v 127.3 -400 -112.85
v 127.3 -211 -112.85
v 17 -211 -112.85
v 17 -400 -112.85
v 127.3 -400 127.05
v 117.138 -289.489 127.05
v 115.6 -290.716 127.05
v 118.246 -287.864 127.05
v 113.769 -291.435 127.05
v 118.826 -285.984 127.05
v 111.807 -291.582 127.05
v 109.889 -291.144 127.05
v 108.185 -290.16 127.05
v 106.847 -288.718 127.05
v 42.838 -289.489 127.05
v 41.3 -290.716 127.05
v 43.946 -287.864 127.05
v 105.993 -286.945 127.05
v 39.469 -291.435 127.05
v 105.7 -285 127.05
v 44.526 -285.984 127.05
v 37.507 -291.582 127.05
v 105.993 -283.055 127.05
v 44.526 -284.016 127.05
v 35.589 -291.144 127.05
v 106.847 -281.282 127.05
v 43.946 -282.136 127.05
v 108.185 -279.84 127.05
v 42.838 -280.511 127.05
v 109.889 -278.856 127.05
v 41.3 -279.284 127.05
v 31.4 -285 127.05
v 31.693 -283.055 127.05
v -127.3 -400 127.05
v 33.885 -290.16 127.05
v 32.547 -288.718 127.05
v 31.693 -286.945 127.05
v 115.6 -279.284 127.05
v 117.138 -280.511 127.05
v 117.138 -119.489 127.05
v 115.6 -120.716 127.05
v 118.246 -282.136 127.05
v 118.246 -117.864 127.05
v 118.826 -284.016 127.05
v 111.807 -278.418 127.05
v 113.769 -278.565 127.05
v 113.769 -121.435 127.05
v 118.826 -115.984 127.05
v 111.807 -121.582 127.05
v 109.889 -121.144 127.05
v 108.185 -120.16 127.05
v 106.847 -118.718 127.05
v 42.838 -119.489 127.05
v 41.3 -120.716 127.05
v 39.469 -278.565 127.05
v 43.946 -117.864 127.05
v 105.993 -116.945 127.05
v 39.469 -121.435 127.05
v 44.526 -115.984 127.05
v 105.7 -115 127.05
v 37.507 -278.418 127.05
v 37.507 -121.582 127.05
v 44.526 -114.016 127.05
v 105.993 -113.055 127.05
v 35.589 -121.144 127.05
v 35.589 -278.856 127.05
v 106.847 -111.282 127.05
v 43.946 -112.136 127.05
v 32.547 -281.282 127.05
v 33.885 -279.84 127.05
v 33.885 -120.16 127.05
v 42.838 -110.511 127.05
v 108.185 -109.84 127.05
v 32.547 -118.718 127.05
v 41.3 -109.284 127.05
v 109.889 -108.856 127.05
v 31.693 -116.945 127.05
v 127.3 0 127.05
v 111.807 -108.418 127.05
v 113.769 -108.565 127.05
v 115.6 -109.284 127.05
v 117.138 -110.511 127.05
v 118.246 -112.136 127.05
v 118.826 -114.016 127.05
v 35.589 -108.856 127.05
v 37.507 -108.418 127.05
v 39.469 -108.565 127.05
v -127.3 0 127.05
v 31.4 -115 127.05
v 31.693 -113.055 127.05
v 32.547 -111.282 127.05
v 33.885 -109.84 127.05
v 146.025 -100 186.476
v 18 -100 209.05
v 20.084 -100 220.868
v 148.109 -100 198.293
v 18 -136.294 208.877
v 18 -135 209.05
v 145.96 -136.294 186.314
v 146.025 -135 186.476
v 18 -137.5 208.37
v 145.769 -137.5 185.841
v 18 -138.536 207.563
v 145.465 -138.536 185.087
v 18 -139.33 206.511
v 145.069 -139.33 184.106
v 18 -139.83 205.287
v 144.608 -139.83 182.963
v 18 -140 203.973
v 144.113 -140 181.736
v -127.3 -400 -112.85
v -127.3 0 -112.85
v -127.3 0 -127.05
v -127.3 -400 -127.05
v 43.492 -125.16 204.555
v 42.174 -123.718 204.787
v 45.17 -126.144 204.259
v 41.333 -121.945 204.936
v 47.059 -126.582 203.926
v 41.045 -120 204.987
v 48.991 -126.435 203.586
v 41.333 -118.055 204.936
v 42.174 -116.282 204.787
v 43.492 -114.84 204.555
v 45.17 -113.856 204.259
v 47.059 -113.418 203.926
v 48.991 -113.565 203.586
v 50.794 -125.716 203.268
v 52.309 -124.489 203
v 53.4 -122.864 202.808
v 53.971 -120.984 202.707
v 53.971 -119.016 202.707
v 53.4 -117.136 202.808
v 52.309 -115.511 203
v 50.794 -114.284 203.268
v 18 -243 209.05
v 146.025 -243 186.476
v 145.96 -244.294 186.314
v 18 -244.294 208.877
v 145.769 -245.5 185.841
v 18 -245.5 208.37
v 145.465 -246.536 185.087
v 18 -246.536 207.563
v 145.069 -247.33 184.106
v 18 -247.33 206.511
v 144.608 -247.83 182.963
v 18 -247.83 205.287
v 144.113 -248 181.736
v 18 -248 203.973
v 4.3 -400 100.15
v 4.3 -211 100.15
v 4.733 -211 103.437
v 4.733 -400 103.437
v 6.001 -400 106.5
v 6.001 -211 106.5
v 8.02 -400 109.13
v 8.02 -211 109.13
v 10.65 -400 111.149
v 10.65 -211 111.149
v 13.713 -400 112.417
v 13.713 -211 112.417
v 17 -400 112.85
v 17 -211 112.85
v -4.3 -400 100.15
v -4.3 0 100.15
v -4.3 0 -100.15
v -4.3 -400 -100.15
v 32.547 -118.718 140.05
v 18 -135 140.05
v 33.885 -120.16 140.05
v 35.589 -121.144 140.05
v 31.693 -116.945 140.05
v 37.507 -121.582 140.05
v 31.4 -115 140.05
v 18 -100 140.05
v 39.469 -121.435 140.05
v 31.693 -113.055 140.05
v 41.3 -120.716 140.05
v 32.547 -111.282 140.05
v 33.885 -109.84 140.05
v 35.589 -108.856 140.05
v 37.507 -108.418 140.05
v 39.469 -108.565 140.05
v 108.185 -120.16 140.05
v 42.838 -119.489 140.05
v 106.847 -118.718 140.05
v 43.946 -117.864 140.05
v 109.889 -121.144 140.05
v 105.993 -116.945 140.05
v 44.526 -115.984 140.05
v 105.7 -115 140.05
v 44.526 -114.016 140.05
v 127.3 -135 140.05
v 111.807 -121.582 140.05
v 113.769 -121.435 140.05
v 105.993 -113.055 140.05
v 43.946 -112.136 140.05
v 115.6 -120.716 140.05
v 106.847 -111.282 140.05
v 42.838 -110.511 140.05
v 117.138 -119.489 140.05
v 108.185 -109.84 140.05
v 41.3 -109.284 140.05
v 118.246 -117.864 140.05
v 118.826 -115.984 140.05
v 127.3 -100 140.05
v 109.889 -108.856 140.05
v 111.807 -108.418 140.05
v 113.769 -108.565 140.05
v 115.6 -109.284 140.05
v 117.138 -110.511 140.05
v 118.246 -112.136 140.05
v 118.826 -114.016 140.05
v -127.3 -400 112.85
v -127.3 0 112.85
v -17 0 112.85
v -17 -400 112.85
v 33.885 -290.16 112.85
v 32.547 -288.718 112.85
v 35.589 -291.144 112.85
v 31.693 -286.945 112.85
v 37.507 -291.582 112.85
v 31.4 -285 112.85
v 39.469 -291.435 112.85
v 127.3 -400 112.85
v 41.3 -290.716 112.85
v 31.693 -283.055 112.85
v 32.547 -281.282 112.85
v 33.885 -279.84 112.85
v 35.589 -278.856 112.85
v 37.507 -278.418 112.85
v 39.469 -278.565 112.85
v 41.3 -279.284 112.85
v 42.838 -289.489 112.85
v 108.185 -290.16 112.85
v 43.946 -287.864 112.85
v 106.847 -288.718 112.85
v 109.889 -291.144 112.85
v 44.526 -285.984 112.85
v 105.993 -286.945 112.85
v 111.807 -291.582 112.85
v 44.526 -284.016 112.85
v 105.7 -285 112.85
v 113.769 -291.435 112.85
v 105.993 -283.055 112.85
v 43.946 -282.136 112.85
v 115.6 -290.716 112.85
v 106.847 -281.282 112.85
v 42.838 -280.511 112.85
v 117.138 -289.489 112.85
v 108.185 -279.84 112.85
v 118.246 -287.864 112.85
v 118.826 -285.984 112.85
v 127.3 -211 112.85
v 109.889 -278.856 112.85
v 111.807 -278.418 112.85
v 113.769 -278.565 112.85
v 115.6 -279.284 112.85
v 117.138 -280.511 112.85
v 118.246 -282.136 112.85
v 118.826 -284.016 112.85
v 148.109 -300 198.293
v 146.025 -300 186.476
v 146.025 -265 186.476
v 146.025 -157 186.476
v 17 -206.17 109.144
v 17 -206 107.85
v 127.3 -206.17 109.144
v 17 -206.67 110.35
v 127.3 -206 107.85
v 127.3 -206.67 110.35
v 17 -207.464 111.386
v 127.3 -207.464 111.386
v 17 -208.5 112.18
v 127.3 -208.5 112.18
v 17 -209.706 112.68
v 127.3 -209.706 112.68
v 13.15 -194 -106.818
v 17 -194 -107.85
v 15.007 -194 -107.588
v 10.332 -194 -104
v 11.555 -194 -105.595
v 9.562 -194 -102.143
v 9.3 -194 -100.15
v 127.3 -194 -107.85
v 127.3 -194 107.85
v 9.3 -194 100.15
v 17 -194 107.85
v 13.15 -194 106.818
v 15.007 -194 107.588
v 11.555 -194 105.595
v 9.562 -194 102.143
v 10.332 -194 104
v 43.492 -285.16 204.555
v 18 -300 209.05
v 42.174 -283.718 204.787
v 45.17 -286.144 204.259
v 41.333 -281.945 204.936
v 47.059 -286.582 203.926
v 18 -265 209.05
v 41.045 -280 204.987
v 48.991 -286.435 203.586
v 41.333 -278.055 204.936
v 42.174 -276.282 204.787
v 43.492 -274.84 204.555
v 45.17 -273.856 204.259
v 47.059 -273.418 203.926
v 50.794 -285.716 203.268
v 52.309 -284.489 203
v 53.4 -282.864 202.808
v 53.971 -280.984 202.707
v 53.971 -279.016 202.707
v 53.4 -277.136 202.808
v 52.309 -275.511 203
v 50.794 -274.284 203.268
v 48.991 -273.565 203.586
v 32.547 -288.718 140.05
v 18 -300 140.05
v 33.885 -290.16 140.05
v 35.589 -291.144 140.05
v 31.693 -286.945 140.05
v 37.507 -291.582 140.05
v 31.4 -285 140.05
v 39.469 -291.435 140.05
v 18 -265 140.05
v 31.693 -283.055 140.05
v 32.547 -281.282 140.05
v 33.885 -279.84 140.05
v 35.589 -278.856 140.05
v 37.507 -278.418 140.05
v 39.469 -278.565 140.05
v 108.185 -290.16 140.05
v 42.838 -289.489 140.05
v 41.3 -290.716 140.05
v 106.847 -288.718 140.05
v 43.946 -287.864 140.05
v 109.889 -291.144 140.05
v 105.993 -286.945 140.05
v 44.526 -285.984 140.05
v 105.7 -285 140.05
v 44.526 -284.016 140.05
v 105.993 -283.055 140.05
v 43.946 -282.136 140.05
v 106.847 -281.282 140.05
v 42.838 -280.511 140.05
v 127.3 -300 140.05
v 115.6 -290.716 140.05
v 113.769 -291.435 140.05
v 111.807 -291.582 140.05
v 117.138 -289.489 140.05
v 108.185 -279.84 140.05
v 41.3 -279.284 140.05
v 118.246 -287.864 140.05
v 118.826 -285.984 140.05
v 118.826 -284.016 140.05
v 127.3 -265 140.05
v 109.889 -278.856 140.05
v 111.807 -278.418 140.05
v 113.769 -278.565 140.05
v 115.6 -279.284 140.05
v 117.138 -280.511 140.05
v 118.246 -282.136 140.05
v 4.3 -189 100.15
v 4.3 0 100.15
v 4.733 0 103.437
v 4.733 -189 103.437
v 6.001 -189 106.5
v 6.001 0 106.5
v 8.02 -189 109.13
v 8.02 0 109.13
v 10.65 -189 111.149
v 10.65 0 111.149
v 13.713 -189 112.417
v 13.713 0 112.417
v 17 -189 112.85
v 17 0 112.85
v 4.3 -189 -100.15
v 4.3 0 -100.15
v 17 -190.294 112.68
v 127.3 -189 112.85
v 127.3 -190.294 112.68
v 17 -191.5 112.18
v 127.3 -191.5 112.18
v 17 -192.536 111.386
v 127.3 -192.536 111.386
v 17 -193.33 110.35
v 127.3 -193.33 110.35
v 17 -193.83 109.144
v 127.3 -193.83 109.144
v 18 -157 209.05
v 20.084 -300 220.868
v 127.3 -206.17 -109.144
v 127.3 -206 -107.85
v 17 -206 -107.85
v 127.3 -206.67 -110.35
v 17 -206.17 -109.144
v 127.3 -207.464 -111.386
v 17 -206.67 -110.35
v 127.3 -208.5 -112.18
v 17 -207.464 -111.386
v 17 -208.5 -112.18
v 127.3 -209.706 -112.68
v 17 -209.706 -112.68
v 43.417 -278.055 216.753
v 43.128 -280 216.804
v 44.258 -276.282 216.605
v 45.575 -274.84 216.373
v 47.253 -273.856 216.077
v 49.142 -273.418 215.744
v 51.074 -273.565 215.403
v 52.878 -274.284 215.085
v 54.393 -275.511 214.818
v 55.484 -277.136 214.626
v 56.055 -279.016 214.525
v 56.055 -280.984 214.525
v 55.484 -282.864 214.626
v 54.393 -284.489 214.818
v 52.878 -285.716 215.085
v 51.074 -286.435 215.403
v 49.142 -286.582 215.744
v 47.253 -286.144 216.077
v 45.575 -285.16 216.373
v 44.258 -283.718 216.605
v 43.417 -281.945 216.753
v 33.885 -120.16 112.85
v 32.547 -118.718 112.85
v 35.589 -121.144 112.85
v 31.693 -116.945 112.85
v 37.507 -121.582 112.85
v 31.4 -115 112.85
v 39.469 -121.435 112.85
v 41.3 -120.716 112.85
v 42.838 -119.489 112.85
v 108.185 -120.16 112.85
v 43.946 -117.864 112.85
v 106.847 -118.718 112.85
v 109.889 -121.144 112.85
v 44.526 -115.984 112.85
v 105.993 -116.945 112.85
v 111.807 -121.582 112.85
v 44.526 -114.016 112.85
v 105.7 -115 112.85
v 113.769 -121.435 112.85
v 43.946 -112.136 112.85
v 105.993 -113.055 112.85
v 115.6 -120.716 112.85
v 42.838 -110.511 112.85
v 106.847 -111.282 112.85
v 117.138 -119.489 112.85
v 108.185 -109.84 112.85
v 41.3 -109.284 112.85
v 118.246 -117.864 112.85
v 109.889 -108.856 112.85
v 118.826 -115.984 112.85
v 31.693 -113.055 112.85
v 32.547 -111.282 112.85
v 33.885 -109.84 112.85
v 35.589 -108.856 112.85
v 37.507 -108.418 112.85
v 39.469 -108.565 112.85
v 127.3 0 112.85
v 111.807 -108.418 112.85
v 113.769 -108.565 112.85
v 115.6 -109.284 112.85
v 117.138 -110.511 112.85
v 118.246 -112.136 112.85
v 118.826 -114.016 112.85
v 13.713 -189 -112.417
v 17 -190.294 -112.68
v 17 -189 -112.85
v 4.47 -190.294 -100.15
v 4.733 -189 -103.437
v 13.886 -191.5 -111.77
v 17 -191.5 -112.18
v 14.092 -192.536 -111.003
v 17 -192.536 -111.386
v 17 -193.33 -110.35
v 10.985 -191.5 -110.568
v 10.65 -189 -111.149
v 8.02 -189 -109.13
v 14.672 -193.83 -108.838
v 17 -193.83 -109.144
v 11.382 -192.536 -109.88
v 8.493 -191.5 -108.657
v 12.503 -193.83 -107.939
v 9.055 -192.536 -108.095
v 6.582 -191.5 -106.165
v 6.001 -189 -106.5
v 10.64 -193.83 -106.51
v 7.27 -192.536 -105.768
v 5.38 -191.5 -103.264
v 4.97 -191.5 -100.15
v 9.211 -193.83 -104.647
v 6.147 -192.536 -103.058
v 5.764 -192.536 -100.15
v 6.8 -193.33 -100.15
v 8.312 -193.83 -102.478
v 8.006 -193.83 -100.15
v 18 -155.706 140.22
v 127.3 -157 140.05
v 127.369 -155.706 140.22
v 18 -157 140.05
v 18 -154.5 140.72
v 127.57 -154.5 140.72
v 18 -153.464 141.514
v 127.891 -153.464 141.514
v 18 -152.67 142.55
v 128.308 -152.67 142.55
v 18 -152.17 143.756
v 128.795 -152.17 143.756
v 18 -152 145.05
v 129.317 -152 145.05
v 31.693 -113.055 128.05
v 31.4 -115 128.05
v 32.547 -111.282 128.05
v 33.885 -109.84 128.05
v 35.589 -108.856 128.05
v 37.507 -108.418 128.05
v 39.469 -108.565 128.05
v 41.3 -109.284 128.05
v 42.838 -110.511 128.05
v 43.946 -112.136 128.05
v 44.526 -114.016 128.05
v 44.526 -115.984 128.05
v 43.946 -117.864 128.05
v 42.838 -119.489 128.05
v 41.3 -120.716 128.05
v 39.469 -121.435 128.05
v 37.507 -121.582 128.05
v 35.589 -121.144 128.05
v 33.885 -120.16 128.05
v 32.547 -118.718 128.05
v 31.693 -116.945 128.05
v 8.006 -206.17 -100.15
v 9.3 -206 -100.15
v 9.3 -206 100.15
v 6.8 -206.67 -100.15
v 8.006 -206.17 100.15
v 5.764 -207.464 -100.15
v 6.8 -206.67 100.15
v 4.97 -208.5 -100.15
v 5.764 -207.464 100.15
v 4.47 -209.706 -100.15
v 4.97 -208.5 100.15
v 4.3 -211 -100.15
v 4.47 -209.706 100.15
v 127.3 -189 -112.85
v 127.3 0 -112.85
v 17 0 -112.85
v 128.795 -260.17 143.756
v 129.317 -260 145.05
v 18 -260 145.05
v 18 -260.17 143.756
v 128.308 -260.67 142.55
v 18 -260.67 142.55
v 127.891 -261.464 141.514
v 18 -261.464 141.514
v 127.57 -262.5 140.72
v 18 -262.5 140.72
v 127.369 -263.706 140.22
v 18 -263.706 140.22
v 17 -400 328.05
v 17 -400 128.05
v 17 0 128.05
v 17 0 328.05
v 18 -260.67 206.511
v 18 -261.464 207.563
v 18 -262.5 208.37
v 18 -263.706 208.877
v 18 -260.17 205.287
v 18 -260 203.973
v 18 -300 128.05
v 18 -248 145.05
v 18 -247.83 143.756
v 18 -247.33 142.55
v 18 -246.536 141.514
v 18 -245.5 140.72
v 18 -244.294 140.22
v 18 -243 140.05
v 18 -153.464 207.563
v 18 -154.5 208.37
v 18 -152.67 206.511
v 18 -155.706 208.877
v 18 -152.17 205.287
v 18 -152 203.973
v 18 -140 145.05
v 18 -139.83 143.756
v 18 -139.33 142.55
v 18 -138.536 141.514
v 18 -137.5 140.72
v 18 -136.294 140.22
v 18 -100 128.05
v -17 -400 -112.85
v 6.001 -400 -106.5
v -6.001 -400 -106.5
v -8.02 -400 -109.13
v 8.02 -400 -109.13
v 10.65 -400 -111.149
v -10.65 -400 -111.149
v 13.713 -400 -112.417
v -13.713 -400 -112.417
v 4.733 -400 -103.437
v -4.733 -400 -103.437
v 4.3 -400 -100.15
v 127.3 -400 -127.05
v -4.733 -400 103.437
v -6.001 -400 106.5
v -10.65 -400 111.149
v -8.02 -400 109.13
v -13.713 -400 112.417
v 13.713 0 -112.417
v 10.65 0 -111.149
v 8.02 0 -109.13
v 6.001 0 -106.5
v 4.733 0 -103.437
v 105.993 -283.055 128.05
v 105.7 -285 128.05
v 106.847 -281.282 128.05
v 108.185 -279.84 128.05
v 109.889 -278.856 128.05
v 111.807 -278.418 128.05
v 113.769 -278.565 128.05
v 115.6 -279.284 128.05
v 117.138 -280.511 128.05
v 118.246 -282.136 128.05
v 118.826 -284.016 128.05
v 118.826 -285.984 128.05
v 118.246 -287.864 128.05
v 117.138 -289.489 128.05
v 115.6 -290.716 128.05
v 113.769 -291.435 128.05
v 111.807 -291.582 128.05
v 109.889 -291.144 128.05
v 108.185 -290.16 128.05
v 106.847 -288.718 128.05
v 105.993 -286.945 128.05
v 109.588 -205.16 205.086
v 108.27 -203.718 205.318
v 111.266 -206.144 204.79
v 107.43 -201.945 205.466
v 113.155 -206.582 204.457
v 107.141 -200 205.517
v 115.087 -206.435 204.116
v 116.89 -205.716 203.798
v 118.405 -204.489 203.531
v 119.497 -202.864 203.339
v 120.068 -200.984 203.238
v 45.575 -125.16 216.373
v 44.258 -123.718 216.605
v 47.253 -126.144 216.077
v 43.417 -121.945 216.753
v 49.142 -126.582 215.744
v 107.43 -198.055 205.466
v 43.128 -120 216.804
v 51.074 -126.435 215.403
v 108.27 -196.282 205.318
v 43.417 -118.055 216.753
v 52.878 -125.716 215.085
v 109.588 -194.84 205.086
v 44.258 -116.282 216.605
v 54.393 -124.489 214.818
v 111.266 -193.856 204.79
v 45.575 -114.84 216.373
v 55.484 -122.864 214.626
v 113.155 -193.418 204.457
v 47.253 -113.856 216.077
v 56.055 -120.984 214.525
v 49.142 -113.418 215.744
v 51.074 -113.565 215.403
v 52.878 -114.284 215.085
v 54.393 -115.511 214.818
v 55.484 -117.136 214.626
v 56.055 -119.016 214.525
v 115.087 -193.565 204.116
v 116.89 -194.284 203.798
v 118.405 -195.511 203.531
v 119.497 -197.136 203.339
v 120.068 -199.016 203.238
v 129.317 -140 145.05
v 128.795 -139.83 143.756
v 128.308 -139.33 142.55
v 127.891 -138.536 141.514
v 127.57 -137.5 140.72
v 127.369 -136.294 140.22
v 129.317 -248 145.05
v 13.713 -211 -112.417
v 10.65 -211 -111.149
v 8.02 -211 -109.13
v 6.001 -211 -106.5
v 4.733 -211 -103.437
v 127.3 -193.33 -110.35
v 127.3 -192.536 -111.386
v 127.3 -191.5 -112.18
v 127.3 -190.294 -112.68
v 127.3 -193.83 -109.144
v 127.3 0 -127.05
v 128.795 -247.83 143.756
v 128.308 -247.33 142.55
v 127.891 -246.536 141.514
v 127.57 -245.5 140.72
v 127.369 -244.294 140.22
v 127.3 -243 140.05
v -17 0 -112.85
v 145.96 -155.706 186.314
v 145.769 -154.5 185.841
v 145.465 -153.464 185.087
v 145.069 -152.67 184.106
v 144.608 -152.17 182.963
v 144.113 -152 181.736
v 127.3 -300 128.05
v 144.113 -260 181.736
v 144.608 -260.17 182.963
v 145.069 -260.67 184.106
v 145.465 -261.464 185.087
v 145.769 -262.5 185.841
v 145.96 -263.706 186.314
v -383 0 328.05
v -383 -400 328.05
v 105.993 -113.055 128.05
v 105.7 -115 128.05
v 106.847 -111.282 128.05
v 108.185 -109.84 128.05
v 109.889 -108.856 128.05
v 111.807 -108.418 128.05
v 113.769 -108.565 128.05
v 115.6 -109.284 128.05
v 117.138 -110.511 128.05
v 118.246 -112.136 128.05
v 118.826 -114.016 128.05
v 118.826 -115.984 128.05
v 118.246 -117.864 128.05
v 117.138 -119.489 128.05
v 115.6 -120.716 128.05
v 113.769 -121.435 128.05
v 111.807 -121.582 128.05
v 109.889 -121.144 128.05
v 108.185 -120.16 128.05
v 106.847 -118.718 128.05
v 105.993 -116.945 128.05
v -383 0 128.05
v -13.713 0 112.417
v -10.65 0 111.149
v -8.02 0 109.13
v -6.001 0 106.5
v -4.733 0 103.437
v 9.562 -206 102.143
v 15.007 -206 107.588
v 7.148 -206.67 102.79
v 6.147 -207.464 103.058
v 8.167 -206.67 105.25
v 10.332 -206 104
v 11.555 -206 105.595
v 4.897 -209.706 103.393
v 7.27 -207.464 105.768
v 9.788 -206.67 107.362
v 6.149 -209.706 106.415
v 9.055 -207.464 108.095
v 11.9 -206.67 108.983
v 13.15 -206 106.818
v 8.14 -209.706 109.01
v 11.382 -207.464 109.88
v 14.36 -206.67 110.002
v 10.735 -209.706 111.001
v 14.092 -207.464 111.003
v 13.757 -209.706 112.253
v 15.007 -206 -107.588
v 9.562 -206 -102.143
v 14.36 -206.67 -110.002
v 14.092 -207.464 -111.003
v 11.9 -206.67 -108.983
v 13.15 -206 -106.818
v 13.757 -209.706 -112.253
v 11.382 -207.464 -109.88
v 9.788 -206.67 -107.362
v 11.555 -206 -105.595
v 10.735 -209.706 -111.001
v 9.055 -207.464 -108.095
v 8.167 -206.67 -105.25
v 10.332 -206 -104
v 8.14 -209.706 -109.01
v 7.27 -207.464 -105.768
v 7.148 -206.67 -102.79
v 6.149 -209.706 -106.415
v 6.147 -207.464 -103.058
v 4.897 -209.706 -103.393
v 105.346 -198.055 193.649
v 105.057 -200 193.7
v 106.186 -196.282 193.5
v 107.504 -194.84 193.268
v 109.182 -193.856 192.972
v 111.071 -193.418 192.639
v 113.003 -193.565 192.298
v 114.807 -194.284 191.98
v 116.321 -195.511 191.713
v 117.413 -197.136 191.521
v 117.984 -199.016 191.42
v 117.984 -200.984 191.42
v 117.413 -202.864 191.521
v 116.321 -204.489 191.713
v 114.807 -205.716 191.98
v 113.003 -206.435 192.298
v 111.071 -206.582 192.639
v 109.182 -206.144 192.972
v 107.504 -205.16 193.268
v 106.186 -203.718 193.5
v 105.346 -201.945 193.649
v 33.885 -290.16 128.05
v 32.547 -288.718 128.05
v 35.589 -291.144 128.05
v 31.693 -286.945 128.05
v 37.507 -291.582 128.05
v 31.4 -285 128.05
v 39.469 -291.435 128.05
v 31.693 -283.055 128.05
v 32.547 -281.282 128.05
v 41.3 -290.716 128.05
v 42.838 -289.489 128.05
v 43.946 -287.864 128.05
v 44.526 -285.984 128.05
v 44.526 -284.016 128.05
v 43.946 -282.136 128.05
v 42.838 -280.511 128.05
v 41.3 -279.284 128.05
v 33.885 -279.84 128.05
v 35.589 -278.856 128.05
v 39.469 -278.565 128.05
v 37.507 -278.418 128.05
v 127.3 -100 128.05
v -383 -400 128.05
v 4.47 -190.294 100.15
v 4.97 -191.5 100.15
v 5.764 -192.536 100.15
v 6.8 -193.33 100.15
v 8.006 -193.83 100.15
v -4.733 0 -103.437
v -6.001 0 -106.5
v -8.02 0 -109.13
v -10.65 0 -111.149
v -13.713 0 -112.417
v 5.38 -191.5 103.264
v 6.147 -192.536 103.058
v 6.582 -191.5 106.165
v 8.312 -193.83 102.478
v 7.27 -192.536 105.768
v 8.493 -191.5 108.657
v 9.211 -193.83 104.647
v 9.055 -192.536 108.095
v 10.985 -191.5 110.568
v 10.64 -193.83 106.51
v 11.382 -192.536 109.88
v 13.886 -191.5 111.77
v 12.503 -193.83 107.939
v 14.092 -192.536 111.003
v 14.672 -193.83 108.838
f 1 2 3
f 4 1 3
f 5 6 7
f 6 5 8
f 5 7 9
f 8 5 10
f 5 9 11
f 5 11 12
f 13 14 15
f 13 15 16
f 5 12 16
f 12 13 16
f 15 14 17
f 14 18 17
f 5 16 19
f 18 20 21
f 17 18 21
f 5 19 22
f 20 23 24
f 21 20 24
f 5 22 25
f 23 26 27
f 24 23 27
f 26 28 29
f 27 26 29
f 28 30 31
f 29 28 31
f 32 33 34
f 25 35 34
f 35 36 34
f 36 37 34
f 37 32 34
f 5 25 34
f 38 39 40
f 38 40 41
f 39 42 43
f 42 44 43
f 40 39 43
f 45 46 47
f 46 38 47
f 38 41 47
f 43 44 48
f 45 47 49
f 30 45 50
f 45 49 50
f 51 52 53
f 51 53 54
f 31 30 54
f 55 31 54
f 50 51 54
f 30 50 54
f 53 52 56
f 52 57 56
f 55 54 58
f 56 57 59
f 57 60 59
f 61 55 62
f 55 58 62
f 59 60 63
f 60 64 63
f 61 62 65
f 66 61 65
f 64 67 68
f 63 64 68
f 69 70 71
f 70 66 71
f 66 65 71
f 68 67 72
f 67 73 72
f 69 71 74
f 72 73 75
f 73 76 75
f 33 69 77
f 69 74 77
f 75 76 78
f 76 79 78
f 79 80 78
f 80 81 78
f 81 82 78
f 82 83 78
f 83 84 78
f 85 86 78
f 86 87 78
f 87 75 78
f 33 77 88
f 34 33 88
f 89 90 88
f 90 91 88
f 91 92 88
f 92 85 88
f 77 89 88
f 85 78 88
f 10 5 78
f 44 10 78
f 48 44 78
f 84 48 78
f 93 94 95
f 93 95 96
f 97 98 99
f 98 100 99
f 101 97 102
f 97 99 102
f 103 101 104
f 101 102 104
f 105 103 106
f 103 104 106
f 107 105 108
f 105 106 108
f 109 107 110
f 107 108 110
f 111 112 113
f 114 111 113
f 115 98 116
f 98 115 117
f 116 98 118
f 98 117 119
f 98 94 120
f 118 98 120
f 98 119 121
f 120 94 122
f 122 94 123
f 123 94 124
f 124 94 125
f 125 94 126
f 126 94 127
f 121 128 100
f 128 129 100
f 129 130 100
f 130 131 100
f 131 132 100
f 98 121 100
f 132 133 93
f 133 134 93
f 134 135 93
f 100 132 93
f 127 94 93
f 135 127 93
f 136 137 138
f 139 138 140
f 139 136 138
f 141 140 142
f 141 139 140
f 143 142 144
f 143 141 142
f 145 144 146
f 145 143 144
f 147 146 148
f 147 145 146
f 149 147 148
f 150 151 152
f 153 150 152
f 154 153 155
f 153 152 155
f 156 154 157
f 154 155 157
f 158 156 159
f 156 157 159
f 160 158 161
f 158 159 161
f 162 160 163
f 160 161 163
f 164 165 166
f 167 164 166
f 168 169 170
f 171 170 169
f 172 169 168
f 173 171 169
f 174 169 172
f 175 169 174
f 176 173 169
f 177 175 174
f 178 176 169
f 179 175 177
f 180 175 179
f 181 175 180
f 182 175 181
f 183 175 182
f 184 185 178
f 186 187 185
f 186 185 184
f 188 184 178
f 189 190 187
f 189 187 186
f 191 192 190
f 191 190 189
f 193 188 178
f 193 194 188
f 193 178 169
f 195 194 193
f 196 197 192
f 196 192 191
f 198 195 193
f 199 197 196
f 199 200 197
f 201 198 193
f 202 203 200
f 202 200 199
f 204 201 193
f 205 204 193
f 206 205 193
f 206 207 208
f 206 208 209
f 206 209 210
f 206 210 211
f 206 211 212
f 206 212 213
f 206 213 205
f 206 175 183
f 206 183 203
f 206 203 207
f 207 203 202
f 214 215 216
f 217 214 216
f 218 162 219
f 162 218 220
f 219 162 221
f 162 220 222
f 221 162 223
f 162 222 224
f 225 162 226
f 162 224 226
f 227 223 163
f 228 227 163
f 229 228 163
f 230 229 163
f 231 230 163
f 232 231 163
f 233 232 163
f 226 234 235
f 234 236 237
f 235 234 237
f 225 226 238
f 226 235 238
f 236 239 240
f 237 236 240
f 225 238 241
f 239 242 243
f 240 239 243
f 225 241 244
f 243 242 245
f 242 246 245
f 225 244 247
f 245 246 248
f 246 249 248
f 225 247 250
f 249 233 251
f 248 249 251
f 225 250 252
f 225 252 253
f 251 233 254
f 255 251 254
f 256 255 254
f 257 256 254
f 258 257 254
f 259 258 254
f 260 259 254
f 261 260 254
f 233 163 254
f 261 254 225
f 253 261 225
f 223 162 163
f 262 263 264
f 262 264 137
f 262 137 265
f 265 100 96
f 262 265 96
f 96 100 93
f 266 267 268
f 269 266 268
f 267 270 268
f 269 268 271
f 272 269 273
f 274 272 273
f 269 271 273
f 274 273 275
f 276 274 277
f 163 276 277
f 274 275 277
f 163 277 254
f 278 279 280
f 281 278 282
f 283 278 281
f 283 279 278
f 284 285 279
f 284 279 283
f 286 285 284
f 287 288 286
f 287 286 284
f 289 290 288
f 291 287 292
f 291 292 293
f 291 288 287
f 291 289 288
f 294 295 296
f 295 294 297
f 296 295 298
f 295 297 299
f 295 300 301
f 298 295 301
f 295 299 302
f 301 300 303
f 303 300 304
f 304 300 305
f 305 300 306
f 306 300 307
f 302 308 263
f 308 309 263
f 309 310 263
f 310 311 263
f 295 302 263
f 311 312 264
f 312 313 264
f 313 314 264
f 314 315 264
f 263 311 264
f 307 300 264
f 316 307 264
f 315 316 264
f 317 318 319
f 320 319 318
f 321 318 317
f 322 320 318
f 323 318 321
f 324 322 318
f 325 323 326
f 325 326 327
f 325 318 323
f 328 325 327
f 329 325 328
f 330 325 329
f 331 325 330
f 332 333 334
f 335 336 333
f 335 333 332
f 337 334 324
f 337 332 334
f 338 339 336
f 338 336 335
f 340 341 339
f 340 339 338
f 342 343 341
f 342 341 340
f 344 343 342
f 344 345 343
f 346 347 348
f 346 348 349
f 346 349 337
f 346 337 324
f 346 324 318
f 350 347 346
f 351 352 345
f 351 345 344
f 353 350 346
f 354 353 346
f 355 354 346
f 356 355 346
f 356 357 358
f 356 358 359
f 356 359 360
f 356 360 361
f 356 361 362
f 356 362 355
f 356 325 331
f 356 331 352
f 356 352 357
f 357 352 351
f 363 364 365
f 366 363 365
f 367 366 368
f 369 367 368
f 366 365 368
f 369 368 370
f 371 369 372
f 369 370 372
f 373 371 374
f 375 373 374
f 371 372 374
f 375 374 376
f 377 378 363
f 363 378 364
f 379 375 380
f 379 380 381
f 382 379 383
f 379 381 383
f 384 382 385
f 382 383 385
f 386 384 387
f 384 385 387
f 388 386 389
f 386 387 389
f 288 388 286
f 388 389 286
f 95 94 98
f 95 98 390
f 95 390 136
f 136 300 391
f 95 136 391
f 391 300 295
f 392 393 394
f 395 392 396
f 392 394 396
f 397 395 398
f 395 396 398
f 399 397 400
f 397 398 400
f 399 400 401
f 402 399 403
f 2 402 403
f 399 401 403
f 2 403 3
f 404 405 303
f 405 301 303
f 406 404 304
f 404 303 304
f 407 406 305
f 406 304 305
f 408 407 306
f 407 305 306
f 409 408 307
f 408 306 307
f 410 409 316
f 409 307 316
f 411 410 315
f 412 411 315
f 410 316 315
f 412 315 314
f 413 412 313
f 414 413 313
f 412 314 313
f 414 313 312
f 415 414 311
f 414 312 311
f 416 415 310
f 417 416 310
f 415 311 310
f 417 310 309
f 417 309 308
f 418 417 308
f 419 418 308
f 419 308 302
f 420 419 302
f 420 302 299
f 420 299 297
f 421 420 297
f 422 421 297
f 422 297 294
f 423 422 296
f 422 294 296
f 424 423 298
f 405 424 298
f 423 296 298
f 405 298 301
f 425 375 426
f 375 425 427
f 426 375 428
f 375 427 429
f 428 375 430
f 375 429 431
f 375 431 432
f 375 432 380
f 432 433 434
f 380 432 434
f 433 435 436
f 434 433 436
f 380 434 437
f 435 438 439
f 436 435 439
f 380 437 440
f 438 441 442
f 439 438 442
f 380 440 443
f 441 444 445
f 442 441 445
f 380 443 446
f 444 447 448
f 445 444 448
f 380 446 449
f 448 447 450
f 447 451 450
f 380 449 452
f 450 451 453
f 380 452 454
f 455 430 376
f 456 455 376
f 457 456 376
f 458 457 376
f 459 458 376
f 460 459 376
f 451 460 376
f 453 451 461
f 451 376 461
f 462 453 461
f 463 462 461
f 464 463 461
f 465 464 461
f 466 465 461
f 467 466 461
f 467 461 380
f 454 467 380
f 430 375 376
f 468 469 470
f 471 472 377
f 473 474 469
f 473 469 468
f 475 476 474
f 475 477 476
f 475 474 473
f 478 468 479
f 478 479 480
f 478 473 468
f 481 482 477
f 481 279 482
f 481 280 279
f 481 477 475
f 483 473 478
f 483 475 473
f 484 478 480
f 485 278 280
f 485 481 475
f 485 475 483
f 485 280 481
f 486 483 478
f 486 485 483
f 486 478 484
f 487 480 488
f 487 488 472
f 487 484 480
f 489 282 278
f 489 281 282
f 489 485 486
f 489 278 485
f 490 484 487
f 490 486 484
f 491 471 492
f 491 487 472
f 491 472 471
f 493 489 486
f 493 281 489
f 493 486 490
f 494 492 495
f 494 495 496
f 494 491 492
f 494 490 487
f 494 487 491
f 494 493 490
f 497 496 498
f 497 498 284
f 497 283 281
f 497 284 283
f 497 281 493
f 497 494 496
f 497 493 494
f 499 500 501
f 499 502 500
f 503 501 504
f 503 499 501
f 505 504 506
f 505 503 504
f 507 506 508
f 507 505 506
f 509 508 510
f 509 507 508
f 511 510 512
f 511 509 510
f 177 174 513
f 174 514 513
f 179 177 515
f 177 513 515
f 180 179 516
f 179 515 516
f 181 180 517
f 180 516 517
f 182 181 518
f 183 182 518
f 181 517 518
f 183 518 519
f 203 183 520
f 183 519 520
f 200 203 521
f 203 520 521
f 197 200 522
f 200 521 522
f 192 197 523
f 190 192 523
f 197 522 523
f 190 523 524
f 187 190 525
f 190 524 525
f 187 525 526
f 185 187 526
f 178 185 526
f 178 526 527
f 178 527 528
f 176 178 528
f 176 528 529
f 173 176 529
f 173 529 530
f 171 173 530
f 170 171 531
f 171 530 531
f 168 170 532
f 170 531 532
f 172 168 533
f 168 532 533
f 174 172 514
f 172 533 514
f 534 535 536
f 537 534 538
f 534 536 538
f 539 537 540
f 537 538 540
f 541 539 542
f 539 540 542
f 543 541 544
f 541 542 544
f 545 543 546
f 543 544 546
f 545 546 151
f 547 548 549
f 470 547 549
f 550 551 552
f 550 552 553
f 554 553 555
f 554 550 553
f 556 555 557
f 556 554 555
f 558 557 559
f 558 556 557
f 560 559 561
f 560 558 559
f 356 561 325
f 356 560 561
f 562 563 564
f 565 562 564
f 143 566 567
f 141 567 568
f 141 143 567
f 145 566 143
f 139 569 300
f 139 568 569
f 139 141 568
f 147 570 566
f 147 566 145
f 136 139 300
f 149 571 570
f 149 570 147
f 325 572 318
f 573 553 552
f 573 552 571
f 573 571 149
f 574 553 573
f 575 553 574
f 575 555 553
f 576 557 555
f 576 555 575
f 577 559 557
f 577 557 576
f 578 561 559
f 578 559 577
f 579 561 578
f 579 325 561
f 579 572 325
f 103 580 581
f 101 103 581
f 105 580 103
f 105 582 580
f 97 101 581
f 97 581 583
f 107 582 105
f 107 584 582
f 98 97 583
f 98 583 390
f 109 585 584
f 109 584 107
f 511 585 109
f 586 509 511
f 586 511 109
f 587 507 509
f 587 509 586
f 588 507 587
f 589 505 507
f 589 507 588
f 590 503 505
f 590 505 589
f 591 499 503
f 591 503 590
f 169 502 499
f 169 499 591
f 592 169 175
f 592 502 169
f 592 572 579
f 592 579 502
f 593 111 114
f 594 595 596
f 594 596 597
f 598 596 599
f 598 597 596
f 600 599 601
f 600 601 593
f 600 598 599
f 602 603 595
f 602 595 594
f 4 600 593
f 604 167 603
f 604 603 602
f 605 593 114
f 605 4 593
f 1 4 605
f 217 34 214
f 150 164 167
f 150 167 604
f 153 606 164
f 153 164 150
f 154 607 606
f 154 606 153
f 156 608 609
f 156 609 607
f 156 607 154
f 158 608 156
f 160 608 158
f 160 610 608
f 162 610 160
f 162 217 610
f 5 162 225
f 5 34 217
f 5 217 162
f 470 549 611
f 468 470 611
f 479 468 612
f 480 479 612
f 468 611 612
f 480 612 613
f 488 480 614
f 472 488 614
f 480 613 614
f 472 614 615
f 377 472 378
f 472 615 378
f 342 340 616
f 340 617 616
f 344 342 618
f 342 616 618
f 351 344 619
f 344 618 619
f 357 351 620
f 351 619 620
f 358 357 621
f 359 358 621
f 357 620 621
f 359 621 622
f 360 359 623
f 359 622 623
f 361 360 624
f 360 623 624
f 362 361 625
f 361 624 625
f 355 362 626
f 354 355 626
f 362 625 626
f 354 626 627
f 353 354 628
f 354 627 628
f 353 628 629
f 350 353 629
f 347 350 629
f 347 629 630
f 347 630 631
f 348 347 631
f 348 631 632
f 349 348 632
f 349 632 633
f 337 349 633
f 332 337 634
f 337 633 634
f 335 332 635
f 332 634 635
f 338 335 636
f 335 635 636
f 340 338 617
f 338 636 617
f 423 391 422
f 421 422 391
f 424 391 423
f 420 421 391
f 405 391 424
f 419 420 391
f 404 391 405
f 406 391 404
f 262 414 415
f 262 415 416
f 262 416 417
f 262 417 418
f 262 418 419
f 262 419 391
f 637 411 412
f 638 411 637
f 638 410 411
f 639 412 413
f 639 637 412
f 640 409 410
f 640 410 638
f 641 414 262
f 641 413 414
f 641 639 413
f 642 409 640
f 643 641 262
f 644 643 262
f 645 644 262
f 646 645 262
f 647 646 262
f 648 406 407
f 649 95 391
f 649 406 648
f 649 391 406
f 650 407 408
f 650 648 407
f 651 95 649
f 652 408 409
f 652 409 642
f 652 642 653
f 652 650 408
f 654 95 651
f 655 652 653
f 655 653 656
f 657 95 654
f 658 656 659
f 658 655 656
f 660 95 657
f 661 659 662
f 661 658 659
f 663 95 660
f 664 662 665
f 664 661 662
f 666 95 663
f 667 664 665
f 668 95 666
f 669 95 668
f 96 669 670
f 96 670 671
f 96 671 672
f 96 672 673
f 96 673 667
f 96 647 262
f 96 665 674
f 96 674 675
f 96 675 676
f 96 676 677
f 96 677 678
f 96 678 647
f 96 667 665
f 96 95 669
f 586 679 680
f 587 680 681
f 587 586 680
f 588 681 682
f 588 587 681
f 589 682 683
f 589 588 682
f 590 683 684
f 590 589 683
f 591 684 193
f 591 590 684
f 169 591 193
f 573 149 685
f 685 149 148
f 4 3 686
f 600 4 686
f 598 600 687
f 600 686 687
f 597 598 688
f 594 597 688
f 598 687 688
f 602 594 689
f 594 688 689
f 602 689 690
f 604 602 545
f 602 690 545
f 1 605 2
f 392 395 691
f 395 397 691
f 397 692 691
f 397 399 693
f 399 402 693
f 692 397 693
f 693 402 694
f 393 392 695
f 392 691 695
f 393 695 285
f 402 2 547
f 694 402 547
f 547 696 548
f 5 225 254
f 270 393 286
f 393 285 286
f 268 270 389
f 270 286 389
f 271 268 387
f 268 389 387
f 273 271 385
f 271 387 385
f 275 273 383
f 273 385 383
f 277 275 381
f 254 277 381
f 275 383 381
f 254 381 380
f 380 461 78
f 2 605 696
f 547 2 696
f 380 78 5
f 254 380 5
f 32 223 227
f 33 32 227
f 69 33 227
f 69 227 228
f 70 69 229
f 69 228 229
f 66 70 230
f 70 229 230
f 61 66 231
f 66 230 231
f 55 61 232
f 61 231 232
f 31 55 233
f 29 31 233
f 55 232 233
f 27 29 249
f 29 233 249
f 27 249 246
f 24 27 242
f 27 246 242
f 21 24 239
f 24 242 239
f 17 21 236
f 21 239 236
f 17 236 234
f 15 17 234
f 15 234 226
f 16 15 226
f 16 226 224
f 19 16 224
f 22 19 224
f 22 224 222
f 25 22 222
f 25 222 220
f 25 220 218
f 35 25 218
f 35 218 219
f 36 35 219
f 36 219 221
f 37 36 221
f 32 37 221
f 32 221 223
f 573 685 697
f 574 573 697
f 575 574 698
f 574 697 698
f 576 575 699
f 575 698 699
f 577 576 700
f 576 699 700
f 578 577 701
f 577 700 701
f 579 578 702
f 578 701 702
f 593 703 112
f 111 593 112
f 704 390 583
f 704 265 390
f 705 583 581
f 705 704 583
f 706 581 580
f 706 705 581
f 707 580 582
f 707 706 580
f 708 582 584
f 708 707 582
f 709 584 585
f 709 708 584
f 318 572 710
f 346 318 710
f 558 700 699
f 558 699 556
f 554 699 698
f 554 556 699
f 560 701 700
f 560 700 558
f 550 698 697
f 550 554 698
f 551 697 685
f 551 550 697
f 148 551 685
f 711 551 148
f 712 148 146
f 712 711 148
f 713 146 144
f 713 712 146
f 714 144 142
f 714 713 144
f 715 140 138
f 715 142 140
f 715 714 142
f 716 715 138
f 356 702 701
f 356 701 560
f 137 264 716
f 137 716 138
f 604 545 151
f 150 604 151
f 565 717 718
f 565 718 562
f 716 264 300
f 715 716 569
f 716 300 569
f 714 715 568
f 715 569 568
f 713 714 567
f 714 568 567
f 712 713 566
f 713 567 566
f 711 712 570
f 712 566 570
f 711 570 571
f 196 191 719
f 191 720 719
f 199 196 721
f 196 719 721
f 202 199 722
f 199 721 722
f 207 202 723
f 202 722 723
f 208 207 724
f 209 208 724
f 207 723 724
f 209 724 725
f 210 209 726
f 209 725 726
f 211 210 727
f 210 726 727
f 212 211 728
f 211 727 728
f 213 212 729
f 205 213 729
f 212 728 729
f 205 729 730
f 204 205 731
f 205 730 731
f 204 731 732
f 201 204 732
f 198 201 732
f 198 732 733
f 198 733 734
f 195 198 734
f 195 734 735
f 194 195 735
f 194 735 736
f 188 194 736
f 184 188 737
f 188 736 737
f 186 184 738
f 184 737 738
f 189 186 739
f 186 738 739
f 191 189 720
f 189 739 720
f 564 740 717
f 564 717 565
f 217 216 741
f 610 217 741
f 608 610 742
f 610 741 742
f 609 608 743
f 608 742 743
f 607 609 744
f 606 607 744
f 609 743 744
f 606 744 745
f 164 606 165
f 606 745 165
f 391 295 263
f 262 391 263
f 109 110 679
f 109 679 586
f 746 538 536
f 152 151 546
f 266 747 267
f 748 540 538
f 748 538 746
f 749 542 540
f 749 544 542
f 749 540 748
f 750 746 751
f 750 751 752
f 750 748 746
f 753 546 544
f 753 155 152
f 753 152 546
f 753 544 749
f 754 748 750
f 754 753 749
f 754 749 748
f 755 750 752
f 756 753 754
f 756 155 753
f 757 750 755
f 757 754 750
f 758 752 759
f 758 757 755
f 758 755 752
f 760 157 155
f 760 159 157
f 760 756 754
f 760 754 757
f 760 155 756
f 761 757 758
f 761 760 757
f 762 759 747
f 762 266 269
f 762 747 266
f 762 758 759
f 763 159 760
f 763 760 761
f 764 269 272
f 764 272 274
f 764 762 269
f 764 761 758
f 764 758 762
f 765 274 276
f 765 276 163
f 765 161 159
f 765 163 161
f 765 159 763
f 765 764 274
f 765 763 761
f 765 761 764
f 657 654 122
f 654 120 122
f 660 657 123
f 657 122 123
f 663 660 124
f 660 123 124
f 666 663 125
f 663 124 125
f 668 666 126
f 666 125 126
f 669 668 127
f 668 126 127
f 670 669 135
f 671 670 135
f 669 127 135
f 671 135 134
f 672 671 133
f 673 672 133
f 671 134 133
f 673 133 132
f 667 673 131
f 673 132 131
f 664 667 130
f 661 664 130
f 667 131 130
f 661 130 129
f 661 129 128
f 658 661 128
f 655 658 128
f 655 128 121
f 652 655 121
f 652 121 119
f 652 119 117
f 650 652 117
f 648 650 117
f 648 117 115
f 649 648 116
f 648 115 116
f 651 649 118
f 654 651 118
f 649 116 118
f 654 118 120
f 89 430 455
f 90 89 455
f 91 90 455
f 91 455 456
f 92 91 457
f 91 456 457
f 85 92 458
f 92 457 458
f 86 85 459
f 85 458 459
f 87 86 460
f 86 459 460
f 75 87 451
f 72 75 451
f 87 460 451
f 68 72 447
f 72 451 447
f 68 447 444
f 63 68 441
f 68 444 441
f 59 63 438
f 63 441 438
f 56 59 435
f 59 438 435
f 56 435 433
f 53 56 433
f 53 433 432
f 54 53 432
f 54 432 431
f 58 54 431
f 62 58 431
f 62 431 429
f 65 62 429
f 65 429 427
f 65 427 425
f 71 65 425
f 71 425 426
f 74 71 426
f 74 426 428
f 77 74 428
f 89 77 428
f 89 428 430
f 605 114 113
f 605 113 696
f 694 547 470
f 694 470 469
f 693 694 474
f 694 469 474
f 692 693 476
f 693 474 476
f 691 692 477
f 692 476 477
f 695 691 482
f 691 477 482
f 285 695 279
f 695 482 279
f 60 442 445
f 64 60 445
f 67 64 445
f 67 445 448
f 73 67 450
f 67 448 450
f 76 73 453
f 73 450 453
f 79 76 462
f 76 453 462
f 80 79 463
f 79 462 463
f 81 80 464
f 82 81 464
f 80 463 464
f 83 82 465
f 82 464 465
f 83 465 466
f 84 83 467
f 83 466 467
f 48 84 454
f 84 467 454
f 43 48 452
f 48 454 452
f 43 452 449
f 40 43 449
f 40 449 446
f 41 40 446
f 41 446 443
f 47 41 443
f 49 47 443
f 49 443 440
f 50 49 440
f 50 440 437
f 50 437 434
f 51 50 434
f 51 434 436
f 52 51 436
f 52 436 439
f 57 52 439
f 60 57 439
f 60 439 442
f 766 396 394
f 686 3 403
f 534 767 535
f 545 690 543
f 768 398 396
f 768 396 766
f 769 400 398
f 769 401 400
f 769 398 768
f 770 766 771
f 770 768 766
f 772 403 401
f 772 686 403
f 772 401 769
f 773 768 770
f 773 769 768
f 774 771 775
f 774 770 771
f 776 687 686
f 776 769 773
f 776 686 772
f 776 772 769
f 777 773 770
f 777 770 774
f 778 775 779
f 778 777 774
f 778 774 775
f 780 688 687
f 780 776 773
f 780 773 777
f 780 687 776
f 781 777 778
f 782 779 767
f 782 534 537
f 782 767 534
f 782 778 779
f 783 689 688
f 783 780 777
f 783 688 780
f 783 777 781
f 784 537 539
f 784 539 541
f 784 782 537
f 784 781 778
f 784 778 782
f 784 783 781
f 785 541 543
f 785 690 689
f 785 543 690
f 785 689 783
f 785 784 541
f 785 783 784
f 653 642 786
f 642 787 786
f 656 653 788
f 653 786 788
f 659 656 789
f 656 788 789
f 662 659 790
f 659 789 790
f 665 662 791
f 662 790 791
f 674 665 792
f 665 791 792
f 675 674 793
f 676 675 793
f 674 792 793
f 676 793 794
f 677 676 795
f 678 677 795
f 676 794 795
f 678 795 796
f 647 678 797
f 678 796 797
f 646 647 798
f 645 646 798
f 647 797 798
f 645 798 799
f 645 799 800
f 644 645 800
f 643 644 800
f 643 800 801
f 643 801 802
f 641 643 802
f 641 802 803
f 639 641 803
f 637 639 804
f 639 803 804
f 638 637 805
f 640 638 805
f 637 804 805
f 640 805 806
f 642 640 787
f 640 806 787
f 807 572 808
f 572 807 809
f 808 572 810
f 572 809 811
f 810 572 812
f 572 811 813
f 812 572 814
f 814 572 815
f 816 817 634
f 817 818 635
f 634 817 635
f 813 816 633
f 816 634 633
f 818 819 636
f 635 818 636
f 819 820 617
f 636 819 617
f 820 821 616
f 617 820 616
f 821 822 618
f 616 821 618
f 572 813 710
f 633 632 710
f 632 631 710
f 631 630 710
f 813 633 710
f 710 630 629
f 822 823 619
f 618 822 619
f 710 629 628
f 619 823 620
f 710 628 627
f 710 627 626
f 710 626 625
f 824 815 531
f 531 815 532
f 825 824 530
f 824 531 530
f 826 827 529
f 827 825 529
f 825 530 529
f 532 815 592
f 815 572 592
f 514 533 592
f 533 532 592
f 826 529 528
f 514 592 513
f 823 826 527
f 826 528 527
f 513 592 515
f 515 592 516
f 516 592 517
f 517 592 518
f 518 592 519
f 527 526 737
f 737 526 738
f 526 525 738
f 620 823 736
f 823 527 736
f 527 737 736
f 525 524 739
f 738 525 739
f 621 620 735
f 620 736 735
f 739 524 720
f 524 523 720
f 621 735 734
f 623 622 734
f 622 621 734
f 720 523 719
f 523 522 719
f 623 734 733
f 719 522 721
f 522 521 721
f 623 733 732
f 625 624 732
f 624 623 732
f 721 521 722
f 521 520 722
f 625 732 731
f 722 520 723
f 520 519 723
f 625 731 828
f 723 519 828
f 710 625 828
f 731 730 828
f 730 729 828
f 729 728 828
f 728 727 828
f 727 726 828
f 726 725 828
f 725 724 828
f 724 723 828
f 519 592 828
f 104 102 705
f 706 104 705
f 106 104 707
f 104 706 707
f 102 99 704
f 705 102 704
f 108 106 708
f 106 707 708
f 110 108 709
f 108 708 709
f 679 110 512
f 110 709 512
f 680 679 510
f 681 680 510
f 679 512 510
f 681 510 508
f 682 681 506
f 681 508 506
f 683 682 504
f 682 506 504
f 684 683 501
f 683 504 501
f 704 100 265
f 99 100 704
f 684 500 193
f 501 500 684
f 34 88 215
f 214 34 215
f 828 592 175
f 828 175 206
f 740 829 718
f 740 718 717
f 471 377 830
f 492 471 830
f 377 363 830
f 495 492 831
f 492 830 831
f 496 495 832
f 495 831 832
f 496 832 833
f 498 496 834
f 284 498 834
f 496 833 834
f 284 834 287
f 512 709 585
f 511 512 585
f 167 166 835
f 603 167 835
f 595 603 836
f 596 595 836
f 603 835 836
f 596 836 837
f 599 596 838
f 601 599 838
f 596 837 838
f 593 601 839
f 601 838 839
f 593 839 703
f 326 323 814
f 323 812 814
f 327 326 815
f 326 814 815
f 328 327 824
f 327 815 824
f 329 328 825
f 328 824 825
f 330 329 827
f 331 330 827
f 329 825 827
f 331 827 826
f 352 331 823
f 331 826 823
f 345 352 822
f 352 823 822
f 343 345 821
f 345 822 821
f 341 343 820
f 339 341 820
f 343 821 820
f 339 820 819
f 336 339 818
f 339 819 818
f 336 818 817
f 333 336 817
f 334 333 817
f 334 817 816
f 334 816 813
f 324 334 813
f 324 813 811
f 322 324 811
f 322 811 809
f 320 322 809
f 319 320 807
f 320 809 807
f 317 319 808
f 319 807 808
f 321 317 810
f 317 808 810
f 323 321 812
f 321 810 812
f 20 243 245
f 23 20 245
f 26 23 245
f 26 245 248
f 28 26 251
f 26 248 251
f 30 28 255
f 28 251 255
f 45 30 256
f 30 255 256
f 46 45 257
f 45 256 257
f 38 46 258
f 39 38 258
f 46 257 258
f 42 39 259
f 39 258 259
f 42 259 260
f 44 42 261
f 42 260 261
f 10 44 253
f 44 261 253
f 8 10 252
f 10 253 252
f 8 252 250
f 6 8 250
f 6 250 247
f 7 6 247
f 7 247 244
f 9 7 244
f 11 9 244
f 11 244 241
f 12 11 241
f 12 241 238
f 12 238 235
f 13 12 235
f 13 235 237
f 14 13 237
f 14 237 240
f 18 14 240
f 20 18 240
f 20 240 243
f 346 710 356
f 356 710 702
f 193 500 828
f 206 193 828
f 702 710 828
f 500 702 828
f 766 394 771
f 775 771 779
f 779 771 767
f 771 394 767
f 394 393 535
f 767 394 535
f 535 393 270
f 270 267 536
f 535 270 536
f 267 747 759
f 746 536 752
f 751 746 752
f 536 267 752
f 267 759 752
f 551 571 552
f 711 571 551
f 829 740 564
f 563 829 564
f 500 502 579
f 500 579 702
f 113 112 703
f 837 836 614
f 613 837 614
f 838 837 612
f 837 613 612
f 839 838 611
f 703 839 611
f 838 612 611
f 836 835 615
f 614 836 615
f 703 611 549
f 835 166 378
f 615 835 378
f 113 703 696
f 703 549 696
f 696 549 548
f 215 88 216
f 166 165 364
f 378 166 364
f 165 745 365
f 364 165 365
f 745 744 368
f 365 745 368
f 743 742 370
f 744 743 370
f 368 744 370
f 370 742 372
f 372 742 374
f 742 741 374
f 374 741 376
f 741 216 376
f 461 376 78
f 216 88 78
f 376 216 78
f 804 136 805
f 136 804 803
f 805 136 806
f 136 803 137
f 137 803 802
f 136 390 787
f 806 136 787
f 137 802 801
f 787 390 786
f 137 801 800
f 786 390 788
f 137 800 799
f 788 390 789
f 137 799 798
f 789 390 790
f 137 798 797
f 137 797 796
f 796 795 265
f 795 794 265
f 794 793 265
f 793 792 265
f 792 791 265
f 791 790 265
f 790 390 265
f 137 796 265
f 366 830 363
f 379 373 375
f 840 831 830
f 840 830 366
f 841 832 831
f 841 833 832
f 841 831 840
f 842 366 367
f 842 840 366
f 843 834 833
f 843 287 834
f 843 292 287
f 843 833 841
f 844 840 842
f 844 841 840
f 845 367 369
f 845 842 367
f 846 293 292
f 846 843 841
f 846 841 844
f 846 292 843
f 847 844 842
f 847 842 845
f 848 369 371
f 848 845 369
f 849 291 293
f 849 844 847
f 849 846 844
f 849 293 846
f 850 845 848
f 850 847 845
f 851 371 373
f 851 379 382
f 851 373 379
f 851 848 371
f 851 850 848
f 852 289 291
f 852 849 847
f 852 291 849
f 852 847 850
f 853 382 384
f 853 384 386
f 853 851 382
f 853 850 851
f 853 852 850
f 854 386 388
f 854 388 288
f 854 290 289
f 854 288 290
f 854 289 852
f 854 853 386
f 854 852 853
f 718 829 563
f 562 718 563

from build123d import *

# Parameters (mm, degrees)
F1_DEPTH  = 400
F3_W      = 400
F3_H      = 400
F4_DEPTH  = 200
F5_W      = 109.3
F5_H      = 200
F6_DEPTH  = 12
F8_D      = 13.2
F8_DEPTH  = 12
F8_TIP    = 3.9656800856
F10_D     = 13.2
F10_DEPTH = 20
F10_TIP   = 3.9656800856
F15_DEPTH = 12
F16_W     = 130
F16_H     = 40
F16_H_2   = 12
F16_H_3   = 148
F17_DEPTH = 12
F18_R     = 5
F21_DEPTH = 6
F22_R     = 5
F24_D     = 13.2
F24_DEPTH = 12
F24_TIP   = 3.9656800856


with BuildPart() as f1:
    # F0 (on Front) → F1 (new body)
    with BuildSketch(Plane.XZ):
        with BuildLine():
            Line((127.3, 112.85), (127.3, 127.05))
            Line((127.3, 127.05), (-127.3, 127.05))
            Line((-127.3, 127.05), (-127.3, 112.85))
            Line((-127.3, 112.85), (-17, 112.85))
            ThreePointArc((-17, 112.85), (-8.0197438789, 109.1302561211), (-4.3, 100.15))
            Line((-4.3, 100.15), (-4.3, -100.15))
            ThreePointArc((-4.3, -100.15), (-8.0197438789, -109.1302561211), (-17, -112.85))
            Line((-17, -112.85), (-127.3, -112.85))
            Line((-127.3, -112.85), (-127.3, -127.05))
            Line((-127.3, -127.05), (127.3, -127.05))
            Line((127.3, -127.05), (127.3, -112.85))
            Line((127.3, -112.85), (17, -112.85))
            ThreePointArc((17, -112.85), (8.0197438789, -109.1302561211), (4.3, -100.15))
            Line((4.3, -100.15), (4.3, 100.15))
            ThreePointArc((4.3, 100.15), (8.0197438789, 109.1302561211), (17, 112.85))
            Line((17, 112.85), (127.3, 112.85))
        make_face()
    extrude(amount=F1_DEPTH)

    # F10
    with Locations(Plane.XY.offset(127.05)):
        with Locations((38, -285), (38, -115), (112.3, -285), (112.3, -115)):
            Hole(F10_D / 2, depth=F10_DEPTH)
            with Locations((0, 0, -(F10_DEPTH + F10_TIP / 2))):  # 118° drill point
                Cone(0, F10_D / 2, F10_TIP, mode=Mode.SUBTRACT)

    # F20 (on mid) → F21 (join, symmetric)
    with BuildSketch(Plane(origin=(0, -200, 0), x_dir=(-1, 0, 0), z_dir=(0, 1, 0))):
        with BuildLine():
            Line((-17, 112.85), (-127.3, 112.85))
            Line((-127.3, 112.85), (-127.3, -112.85))
            Line((-127.3, -112.85), (-17, -112.85))
            ThreePointArc((-17, -112.85), (-8.0197438789, -109.1302561211), (-4.3, -100.15))
            Line((-4.3, -100.15), (-4.3, 100.15))
            ThreePointArc((-4.3, 100.15), (-8.0197438789, 109.1302561211), (-17, 112.85))
        make_face()
    extrude(amount=F21_DEPTH, both=True)

    # F22
    f22_edges = [f1.edges().sort_by_distance(p)[0] for p in [
        (72.15, -194, 112.85),
        (4.3, -206, 0),
    ]]
    fillet(f22_edges, radius=F22_R)


with BuildPart() as f4:
    # F3 (on offset) → F4 (new body)
    with BuildSketch(Plane.XY.offset(128.05)):
        with Locations((-183, -200)):
            Rectangle(F3_W, F3_H)
    extrude(amount=F4_DEPTH)


with BuildPart() as f6:
    # F5 (on offset) → F6 (new body)
    with BuildSketch(Plane.XY.offset(128.05)):
        with Locations((72.65, -200)):
            Rectangle(F5_W, F5_H)
    extrude(amount=F6_DEPTH)

    # F8
    with Locations(Plane.XY.offset(140.05)):
        with Locations((38, -285), (112.3, -285), (38, -115), (112.3, -115)):
            Hole(F8_D / 2, depth=F8_DEPTH)
            with Locations((0, 0, -(F8_DEPTH + F8_TIP / 2))):  # 118° drill point
                Cone(0, F8_D / 2, F8_TIP, mode=Mode.SUBTRACT)

    # F12 (on offset) + F14 (on offset) → F15 (join)
    with BuildSketch(Plane(origin=(0, -152, 0), x_dir=(-1, 0, 0), z_dir=(0, 1, 0))):
        Polygon((-127.3, 140.05), (-18, 140.05), (-18, 209.05), (-146.0250078916, 186.4757369033), align=None)
    with BuildSketch(Plane.XZ.offset(260)):
        Polygon((18, 209.05), (18, 140.05), (127.3, 140.05), (146.0250078916, 186.4757369033), align=None)
    extrude(amount=F15_DEPTH, dir=(0, 1, 0))

    # F16 (on face) → F17 (join)
    with BuildSketch(Plane(origin=(36.292421894, 0, 205.8245524776), x_dir=(0.984807753, 0, -0.1736481777), z_dir=(0.1736481777, 0, 0.984807753))):
        with Locations((46.4253880129, -280)):
            Rectangle(F16_W, F16_H)
        with Locations((46.4253880129, -254)):
            Rectangle(F16_W, F16_H_2)
        with Locations((46.4253880129, -174)):
            Rectangle(F16_W, F16_H_3)
    extrude(amount=F17_DEPTH)

    # F18
    f18_edges = [f6.edges().sort_by_distance(p)[0] for p in [
        (72.65, -260, 140.05),
        (72.65, -248, 140.05),
        (72.65, -140, 140.05),
        (72.65, -152, 140.05),
        (82.012504, -260, 197.762868),
        (82.012504, -248, 197.762868),
        (82.012504, -140, 197.762868),
        (82.012504, -152, 197.762868),
    ]]
    fillet(f18_edges, radius=F18_R)

    # F24
    with Locations(Plane(origin=(38.376200026, 0, 217.6422455137), x_dir=(0.984807753, 0, -0.1736481777), z_dir=(0.1736481777, 0, 0.984807753))):
        with Locations((76.4253880129, -200), (11.4253880129, -280), (11.4253880129, -120)):
            Hole(F24_D / 2, depth=F24_DEPTH)
            with Locations((0, 0, -(F24_DEPTH + F24_TIP / 2))):  # 118° drill point
                Cone(0, F24_D / 2, F24_TIP, mode=Mode.SUBTRACT)


solid = Compound([f1.part, f4.part, f6.part])
